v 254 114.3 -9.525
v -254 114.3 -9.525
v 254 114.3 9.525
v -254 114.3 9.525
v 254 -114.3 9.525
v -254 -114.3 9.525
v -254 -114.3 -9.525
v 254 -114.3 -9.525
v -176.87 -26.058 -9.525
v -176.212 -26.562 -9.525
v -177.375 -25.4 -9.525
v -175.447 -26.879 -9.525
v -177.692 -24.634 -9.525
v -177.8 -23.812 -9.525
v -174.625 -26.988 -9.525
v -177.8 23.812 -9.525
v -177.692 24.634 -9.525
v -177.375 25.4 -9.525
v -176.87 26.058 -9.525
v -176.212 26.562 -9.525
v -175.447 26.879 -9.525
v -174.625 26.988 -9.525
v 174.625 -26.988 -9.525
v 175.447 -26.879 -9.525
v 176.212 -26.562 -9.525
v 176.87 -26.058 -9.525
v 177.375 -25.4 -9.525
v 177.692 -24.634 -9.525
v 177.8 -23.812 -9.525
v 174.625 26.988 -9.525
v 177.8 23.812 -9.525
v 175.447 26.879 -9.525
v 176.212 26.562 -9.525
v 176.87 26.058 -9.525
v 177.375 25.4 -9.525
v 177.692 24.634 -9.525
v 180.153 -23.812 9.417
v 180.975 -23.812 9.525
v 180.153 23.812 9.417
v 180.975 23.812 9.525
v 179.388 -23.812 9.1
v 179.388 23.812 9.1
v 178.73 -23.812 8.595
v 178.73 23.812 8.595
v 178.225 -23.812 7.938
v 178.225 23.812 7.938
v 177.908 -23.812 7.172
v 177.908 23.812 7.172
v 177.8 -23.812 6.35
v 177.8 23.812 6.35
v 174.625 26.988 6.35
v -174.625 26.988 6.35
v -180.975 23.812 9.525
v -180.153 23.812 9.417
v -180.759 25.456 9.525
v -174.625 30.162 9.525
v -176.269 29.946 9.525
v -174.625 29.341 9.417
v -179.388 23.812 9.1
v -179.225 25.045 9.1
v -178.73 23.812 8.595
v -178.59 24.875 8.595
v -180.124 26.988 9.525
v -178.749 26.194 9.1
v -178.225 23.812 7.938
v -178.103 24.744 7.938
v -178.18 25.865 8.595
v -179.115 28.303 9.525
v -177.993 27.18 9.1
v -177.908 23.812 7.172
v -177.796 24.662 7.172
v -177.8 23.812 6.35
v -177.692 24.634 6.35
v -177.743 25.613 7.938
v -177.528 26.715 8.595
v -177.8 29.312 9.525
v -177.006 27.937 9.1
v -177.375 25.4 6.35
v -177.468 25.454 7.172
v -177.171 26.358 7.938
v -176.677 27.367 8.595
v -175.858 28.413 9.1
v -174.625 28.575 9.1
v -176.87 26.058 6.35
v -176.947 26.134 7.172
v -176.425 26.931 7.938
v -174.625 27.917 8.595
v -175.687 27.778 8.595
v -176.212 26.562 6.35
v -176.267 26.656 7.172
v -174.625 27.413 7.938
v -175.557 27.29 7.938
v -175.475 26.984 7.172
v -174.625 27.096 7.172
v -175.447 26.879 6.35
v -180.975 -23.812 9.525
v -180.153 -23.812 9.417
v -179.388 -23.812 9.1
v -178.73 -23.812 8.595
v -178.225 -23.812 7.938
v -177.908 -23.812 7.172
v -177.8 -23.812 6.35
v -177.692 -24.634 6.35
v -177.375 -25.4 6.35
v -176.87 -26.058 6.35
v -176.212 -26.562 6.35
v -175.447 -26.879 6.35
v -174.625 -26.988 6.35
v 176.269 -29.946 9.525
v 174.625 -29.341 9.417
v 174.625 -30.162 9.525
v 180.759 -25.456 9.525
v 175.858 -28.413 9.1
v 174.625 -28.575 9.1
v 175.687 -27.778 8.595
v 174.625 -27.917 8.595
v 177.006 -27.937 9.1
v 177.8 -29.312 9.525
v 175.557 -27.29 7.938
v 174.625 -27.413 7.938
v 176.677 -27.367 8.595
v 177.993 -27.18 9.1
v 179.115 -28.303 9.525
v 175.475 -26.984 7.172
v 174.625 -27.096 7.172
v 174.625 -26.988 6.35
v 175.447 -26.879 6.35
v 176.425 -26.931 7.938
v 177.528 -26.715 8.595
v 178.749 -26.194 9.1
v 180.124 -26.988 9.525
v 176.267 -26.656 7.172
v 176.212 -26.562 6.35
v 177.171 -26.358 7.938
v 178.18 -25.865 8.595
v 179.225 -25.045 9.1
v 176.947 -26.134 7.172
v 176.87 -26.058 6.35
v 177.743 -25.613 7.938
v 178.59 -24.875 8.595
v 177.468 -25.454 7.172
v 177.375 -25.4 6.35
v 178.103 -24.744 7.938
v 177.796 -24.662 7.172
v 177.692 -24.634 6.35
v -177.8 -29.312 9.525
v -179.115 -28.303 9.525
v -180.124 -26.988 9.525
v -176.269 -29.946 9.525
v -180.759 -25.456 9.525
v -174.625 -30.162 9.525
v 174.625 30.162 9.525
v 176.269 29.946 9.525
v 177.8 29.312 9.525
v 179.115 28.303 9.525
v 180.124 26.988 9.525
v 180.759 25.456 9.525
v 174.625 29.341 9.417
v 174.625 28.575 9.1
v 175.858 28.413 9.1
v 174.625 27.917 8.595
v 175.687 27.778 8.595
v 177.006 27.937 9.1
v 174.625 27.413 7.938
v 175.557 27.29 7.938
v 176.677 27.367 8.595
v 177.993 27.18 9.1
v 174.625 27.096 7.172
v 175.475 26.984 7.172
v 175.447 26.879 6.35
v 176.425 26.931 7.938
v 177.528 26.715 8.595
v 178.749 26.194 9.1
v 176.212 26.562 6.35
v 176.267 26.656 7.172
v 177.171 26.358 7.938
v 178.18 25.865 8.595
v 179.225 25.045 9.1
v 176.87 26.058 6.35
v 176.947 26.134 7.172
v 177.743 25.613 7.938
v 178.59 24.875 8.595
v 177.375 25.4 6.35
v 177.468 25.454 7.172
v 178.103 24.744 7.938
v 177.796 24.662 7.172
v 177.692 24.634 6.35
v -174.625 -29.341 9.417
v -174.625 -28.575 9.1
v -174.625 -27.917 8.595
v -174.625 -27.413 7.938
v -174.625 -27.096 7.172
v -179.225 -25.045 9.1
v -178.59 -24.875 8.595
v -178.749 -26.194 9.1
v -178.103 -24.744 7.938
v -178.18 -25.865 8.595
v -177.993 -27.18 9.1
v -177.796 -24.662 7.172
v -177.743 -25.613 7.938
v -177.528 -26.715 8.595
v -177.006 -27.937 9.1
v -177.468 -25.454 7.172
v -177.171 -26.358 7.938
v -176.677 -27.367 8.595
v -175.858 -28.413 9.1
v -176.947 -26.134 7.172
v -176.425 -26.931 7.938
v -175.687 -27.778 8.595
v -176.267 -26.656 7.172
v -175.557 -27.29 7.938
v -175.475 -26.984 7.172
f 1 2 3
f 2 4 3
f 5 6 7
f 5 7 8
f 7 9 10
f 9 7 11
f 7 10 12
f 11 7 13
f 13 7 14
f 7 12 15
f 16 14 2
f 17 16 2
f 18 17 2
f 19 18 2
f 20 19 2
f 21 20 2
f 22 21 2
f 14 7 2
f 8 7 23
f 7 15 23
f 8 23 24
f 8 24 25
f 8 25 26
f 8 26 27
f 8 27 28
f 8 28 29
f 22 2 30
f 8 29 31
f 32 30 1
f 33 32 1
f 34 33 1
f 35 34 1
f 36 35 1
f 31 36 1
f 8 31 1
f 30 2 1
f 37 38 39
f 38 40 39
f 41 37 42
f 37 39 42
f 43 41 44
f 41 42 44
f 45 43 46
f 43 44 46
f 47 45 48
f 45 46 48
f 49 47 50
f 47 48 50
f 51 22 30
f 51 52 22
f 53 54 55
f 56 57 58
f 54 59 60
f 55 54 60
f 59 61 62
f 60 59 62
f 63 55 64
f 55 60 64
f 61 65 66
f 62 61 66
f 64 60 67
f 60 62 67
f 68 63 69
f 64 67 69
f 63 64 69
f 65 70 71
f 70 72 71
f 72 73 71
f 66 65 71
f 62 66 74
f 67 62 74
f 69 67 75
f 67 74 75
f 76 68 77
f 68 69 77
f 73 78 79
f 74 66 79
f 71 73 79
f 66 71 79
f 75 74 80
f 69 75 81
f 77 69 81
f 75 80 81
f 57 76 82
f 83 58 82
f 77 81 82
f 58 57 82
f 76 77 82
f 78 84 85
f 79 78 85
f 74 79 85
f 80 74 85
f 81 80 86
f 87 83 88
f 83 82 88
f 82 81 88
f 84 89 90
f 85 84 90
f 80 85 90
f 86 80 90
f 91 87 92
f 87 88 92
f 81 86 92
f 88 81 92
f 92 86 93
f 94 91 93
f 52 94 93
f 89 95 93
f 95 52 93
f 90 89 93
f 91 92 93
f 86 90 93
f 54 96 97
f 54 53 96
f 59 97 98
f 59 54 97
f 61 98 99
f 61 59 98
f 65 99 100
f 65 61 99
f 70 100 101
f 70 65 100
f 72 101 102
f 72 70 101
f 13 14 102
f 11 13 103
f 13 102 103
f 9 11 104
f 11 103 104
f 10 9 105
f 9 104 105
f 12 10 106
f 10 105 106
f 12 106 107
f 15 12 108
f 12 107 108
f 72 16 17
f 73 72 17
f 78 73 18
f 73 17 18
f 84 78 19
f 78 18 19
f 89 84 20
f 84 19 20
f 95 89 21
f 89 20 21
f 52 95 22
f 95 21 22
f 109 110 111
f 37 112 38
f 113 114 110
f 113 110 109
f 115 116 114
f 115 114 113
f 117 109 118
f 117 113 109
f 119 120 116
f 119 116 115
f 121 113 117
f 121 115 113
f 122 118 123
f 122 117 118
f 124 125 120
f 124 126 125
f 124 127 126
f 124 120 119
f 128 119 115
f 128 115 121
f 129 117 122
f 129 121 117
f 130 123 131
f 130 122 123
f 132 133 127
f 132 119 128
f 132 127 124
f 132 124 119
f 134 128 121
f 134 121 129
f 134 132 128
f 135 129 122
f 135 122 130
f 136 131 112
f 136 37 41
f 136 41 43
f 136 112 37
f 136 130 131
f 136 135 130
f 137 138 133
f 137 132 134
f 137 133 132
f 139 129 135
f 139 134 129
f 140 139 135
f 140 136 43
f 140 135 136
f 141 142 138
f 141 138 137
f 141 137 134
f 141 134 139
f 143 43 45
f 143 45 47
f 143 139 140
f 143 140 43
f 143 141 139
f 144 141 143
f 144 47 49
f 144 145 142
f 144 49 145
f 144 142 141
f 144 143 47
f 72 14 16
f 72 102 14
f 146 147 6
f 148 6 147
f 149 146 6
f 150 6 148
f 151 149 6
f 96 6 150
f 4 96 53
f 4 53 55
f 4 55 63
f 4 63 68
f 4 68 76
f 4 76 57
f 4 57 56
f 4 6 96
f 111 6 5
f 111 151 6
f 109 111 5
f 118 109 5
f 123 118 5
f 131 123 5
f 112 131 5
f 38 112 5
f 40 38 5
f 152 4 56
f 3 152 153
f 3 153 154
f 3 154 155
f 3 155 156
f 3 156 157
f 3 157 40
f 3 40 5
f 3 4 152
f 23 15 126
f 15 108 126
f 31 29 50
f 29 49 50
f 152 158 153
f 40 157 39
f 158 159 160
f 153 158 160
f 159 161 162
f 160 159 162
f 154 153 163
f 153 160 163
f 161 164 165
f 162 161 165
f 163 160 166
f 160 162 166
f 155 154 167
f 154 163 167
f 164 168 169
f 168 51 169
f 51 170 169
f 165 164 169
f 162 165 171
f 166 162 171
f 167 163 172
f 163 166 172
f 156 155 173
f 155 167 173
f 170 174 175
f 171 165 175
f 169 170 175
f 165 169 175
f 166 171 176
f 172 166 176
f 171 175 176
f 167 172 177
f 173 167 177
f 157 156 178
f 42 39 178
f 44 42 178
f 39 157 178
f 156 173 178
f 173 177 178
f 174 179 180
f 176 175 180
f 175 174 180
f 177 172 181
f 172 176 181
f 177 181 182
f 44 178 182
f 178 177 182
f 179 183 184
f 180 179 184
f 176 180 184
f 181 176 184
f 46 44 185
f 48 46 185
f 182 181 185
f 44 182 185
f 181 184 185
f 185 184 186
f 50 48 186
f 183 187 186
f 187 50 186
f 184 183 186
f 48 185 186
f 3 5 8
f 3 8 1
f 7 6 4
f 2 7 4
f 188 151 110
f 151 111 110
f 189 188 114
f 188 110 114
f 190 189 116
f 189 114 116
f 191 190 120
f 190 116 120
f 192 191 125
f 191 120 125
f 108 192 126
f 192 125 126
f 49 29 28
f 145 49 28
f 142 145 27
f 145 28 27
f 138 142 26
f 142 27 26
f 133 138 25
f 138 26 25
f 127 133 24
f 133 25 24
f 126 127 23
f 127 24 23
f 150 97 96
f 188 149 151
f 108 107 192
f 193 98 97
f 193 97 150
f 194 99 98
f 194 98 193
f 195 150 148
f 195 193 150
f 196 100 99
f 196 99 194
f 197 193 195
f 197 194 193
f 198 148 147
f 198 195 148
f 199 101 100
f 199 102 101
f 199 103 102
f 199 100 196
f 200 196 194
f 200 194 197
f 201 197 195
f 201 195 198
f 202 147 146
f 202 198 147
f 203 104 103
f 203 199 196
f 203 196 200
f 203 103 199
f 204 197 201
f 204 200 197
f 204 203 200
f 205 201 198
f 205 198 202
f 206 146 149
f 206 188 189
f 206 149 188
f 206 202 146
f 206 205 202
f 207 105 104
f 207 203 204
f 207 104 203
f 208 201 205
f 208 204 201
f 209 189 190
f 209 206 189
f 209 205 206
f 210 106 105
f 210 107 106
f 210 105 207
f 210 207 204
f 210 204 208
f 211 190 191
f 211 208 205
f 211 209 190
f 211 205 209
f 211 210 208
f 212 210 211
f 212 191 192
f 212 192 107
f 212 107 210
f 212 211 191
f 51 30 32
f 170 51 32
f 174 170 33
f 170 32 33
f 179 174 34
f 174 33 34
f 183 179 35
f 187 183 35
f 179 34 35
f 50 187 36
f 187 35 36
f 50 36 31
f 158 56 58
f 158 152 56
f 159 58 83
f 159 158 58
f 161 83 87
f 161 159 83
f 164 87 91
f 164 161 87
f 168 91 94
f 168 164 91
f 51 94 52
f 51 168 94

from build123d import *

# Parameters (mm, degrees)
F0_W     = 508
F0_H     = 228.6
F0_W_2   = 355.6
F0_H_2   = 53.975
F1_DEPTH = 9.525
F2_R     = 3.175


with BuildPart() as f1:
    # F0 (on Top) → F1 (new body, symmetric)
    with BuildSketch(Plane.XY):
        Rectangle(F0_W, F0_H)
        Rectangle(F0_W_2, F0_H_2, mode=Mode.SUBTRACT)
    extrude(amount=F1_DEPTH, both=True)

    # F2
    f2_edges = [f1.edges().sort_by_distance(p)[0] for p in [
        (-177.8, 0, 9.525),
        (0, 26.9875, 9.525),
        (0, -26.9875, 9.525),
        (177.8, 0, 9.525),
        (177.8, 26.9875, 0),
        (-177.8, 26.9875, 0),
        (-177.8, -26.9875, 0),
        (177.8, -26.9875, 0),
    ]]
    fillet(f2_edges, radius=F2_R)


solid = f1.part
